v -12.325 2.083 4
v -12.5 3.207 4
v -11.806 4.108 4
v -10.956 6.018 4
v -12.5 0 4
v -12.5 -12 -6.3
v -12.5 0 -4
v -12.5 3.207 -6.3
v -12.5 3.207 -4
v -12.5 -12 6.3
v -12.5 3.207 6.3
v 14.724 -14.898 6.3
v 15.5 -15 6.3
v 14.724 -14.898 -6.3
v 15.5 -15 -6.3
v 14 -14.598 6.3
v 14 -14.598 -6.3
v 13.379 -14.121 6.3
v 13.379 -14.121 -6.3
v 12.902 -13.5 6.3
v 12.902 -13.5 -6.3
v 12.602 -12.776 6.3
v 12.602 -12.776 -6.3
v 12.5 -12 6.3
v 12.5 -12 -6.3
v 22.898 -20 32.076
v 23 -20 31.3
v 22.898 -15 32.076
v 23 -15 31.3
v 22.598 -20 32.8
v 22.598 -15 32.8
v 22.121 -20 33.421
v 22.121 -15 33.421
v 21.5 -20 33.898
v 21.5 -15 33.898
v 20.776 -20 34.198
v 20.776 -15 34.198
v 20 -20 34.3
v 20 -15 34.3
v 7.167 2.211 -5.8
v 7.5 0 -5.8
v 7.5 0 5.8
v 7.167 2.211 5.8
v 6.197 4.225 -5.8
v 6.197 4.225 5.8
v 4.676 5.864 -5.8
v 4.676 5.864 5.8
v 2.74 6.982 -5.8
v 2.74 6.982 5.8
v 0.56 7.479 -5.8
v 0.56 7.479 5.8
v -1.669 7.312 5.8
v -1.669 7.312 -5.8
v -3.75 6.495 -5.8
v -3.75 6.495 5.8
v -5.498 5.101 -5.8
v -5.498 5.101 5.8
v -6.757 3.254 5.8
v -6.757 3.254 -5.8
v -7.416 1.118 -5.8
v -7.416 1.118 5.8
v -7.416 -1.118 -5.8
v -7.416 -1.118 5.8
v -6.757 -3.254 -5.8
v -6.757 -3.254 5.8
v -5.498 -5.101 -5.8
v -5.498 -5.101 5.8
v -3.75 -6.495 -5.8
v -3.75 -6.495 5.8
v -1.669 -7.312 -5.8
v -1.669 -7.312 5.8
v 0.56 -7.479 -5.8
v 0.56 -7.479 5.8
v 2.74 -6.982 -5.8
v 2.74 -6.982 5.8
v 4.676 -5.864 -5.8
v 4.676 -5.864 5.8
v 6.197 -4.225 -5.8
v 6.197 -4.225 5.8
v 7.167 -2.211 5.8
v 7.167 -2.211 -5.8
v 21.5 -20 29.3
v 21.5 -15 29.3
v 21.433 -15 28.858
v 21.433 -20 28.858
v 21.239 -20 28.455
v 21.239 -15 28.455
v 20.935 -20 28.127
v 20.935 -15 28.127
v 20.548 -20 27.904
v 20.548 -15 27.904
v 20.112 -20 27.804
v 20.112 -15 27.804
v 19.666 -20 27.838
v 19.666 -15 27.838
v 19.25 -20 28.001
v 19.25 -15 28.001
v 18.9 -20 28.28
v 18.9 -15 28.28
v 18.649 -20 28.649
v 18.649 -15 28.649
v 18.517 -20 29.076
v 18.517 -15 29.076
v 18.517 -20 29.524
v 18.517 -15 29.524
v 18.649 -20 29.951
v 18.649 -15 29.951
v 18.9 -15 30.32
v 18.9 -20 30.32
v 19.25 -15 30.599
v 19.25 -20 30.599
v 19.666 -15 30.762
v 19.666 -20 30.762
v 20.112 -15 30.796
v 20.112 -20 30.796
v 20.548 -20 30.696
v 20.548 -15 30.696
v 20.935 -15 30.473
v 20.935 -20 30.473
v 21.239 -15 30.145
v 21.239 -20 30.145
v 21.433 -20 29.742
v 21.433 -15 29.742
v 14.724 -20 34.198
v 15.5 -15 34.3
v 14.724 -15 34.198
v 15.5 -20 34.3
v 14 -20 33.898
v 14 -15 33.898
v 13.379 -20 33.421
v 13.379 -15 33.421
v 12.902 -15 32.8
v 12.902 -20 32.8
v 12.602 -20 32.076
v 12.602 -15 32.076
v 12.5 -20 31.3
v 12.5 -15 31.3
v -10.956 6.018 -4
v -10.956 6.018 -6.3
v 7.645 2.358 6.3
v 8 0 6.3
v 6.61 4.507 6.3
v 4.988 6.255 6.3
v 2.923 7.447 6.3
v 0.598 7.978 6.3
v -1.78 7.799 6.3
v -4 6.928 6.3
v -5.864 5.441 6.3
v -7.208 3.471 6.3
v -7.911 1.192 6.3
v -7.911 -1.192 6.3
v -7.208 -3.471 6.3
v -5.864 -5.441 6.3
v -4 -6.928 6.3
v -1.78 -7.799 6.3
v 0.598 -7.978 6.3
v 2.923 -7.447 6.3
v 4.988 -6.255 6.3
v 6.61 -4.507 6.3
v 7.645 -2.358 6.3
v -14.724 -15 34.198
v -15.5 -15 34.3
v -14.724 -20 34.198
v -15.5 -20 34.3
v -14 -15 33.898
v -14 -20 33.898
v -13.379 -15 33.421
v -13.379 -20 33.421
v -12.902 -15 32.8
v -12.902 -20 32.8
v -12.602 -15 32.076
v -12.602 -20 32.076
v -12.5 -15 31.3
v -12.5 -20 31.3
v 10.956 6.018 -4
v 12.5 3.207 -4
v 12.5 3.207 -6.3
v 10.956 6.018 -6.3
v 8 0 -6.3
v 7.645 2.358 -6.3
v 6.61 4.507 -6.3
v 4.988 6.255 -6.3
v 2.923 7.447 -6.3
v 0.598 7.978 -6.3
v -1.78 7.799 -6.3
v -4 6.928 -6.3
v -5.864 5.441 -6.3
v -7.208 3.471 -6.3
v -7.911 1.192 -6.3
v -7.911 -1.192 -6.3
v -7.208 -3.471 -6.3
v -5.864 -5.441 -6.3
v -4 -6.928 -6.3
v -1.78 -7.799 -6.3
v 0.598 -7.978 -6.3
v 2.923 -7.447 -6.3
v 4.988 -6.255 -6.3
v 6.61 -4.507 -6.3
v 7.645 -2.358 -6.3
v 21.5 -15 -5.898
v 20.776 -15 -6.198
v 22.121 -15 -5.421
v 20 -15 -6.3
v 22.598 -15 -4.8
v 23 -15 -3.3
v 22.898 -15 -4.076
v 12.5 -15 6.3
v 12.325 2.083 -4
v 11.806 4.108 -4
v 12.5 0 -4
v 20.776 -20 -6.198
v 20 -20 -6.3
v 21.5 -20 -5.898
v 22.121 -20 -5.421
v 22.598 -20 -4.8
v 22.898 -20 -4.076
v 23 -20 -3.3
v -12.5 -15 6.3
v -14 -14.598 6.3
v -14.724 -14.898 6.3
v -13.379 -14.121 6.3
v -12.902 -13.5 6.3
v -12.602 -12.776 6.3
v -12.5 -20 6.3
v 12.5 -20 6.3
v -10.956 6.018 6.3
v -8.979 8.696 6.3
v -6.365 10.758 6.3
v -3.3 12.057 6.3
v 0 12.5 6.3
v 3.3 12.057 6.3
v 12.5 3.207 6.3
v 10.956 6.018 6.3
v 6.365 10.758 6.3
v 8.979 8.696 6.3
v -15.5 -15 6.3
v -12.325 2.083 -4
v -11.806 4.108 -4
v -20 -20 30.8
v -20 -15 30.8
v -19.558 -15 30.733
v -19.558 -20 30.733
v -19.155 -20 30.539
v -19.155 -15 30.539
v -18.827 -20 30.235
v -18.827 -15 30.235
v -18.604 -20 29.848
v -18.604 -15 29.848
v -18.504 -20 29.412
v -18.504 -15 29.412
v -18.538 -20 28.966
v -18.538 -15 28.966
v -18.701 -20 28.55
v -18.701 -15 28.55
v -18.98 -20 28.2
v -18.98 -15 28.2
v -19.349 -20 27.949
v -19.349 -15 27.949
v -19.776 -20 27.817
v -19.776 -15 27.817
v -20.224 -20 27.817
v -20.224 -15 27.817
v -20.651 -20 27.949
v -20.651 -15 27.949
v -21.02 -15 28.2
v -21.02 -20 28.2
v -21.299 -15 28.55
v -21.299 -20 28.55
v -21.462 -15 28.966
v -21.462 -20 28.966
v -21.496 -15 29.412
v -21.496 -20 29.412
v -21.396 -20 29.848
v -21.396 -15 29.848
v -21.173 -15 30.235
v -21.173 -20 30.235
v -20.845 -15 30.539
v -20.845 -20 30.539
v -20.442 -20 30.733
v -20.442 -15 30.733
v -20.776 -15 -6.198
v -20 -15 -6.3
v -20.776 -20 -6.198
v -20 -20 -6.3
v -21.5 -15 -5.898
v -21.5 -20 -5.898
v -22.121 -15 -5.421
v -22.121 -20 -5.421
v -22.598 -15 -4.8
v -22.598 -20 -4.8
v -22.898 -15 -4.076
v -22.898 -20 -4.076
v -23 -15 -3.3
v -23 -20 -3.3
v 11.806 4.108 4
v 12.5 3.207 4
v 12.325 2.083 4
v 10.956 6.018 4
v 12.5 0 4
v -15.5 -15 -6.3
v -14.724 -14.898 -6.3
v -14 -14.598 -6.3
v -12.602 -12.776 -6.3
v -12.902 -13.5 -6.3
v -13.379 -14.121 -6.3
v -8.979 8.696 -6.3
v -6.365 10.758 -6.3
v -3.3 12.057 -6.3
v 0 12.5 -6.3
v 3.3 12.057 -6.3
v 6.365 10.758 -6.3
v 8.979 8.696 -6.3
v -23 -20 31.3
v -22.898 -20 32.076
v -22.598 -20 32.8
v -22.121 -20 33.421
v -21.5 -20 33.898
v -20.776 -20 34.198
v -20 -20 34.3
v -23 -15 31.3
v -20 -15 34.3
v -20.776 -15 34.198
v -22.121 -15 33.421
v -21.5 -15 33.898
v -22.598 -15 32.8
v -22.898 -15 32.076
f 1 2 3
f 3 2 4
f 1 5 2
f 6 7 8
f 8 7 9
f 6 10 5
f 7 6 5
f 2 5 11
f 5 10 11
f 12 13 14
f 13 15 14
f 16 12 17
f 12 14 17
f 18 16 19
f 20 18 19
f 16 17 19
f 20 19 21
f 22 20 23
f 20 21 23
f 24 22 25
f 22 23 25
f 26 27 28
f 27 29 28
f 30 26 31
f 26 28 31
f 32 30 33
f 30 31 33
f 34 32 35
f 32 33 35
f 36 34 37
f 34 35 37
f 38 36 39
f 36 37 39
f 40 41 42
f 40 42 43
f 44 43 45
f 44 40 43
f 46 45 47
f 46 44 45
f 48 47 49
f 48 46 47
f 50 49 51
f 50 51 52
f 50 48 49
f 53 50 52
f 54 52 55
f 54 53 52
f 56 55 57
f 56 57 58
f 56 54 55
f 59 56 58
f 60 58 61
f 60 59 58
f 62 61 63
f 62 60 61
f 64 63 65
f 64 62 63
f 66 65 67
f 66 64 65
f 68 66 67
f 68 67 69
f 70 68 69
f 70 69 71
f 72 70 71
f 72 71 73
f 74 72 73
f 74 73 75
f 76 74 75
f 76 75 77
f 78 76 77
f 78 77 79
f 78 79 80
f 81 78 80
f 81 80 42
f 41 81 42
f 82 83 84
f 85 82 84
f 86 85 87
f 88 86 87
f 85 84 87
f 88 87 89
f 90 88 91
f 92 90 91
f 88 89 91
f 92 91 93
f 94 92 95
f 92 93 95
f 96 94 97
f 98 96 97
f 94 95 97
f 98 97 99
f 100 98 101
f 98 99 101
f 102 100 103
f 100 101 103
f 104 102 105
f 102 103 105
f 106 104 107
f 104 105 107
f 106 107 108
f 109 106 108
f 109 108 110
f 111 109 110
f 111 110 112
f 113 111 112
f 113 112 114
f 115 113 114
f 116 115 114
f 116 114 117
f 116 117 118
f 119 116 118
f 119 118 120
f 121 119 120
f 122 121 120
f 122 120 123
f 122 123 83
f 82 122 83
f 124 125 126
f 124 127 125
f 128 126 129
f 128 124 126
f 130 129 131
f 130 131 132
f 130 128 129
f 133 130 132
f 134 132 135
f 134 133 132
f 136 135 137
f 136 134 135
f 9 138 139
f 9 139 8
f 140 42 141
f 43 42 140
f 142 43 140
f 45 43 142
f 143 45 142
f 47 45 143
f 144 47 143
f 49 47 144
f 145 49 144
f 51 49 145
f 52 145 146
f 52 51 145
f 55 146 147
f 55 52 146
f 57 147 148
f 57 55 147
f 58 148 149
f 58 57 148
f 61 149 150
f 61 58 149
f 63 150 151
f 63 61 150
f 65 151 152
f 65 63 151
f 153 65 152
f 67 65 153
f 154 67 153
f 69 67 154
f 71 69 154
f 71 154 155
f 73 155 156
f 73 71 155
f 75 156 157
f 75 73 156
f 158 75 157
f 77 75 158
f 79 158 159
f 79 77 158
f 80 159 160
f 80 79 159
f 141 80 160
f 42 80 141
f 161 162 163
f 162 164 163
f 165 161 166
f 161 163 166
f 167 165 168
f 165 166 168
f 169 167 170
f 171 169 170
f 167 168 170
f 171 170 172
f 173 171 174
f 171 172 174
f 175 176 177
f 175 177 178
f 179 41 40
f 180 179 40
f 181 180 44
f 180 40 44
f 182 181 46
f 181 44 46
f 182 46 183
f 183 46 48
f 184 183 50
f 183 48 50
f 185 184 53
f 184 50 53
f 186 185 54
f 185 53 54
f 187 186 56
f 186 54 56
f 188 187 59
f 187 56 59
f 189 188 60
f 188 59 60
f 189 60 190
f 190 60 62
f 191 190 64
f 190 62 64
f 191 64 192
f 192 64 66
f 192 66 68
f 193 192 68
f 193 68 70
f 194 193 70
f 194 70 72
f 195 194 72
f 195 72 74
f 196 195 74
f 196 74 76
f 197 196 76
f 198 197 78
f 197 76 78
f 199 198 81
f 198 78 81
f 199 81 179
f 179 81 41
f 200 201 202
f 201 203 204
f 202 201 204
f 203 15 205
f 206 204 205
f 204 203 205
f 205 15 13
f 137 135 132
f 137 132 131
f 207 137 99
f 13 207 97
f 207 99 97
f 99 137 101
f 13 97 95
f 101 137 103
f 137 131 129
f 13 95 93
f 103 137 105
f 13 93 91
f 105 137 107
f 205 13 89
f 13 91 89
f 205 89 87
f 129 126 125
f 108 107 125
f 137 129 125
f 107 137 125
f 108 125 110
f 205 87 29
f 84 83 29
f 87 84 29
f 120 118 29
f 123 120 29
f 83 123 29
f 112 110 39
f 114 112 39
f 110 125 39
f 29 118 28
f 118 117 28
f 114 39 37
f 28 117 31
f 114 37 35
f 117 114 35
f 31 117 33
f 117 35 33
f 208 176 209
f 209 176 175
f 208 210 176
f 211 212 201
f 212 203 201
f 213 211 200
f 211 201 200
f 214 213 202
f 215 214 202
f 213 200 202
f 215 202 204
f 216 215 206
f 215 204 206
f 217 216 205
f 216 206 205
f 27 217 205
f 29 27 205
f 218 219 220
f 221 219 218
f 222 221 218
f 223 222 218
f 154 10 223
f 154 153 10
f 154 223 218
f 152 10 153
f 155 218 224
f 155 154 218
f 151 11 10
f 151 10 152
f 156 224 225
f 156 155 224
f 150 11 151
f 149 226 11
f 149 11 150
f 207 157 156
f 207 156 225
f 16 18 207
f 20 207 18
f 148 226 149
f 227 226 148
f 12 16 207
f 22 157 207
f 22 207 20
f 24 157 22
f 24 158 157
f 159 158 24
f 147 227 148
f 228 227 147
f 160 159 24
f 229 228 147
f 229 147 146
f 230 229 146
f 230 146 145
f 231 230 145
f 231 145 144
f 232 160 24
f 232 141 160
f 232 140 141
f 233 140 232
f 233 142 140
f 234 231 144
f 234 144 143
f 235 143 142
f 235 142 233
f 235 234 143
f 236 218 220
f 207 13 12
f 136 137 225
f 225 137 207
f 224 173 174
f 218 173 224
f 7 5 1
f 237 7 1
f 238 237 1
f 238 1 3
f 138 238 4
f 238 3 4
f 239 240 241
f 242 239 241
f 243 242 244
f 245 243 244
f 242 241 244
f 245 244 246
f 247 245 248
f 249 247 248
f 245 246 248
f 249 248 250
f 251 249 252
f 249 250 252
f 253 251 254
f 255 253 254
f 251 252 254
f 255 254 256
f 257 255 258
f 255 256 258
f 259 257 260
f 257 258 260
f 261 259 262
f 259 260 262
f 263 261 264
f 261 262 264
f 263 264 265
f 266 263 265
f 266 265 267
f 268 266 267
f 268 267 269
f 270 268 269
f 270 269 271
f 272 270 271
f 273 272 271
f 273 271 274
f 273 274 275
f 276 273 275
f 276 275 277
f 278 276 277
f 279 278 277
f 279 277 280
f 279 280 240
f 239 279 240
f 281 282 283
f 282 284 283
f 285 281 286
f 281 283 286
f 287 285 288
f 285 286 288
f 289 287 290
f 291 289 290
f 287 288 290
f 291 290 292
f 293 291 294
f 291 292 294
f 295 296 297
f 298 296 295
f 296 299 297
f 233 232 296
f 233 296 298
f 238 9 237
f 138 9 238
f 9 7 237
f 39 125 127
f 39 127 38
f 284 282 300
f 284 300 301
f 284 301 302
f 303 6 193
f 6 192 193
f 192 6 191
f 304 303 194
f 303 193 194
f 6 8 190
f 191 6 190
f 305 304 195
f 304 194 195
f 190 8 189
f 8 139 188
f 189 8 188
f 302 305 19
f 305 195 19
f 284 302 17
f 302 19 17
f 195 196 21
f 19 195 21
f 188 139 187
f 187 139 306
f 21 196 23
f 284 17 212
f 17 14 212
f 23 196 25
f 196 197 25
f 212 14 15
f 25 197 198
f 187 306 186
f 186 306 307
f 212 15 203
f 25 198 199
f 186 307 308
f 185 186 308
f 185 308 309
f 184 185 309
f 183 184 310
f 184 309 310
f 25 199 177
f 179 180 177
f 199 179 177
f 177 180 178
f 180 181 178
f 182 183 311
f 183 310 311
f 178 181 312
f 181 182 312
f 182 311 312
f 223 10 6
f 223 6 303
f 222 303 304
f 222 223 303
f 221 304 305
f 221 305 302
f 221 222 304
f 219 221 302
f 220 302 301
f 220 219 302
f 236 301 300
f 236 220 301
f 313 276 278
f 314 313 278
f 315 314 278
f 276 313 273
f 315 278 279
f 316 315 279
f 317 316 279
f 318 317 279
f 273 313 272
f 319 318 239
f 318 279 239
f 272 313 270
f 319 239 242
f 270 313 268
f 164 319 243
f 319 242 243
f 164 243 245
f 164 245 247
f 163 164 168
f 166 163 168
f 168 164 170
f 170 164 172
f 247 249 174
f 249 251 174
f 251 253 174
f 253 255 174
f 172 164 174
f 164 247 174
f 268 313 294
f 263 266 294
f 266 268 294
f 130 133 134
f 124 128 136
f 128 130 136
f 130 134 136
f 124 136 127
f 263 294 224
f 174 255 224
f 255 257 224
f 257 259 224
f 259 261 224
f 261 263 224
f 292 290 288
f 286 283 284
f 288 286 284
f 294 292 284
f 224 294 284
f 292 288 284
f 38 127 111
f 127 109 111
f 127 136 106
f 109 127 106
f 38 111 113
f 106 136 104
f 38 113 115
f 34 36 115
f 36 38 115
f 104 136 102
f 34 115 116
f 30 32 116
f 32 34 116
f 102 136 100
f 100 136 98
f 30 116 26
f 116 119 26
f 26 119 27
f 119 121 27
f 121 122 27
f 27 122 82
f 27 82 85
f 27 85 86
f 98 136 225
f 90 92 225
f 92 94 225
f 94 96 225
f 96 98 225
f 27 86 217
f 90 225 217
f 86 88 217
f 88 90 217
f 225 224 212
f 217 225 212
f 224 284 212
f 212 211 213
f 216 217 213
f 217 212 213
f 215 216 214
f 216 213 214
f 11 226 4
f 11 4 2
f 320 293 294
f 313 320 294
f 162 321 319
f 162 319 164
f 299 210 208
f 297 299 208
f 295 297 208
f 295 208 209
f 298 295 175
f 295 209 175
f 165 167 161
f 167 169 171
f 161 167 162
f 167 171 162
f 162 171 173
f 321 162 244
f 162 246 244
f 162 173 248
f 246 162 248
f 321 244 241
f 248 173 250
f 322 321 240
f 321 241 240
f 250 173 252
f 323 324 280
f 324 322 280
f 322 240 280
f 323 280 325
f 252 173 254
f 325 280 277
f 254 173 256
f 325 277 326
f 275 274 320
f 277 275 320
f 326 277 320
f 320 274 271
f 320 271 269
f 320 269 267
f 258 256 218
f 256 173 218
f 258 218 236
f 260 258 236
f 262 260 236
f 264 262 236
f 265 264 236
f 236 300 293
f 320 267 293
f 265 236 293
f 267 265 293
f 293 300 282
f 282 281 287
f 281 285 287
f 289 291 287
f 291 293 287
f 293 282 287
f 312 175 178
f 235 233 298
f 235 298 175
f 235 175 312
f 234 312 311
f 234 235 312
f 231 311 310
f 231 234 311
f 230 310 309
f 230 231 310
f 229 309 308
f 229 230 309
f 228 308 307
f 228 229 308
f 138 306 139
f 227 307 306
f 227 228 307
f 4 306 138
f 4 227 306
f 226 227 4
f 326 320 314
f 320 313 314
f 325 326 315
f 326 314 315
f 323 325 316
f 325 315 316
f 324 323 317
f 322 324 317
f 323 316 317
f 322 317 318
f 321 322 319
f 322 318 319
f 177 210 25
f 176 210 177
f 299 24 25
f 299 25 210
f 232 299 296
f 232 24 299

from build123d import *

# Parameters (mm, degrees)
SKETCH_1_R           = 7.5
EXTRUDE_1_DEPTH      = 6.3
CUT_EXTRUDE_1_DEPTH  = 4
SKETCH_3_R           = 2
CUT_EXTRUDE_2_DEPTH  = 41.027365639
CHAMFER_1_SIZE       = 0.5
EXTRUDE_2_DEPTH      = 28
EXTRUDE_2_DEPTH_BACK = 12.6
SKETCH_5_R           = 1.5
CUT_EXTRUDE_3_DEPTH  = 46.885618662
SKETCH_6_W           = 25
SKETCH_6_H           = 28
CUT_EXTRUDE_4_DEPTH  = 46.885618662
SKETCH_7_W           = 10
SKETCH_7_H           = 22.359066313
SKETCH_7_W_2         = 10.5
SKETCH_7_H_2         = 23.032343059
CUT_EXTRUDE_5_DEPTH  = 42.388404173
FILLET_1_R           = 3


with BuildPart() as part:
    # 草图1 → 凸台-拉伸1 (new, symmetric)
    with BuildSketch(Plane.XY):
        with BuildLine():
            Line((-22.5, -20), (22.5, -20))
            Line((22.5, -20), (22.5, -15))
            Line((22.5, -15), (10.956194261, 6.017624724))
            ThreePointArc((10.956194261, 6.017624724), (0, 12.5), (-10.956194261, 6.017624724))
            Line((-10.956194261, 6.017624724), (-22.5, -15))
            Line((-22.5, -15), (-22.5, -20))
        make_face()
        Circle(SKETCH_1_R, mode=Mode.SUBTRACT)
    extrude(amount=EXTRUDE_1_DEPTH, both=True)

    # 草图2 → 切除-拉伸1 (cut, symmetric)
    with BuildSketch(Plane.XY):
        with BuildLine():
            Line((22.5, -15), (12.5, -15))
            Line((12.5, -15), (12.5, 0))
            ThreePointArc((12.5, 0), (12.107898832, 3.106249486), (10.956194261, 6.017624724))
            Line((10.956194261, 6.017624724), (22.5, -15))
        make_face()
        with BuildLine():
            Line((-22.5, -15), (-12.5, -15))
            Line((-12.5, -15), (-12.5, 0))
            ThreePointArc((-12.5, 0), (-12.107898832, 3.106249486), (-10.956194261, 6.017624724))
            Line((-10.956194261, 6.017624724), (-22.5, -15))
        make_face()
    extrude(amount=CUT_EXTRUDE_1_DEPTH, both=True, mode=Mode.SUBTRACT)

    # 草图3 → 切除-拉伸2 (cut, through all)
    with BuildSketch(Plane.XZ.offset(20)):
        with Locations((17.5, 0)):
            Circle(SKETCH_3_R)
        with Locations((-17.5, 0)):
            Circle(SKETCH_3_R)
    extrude(amount=-CUT_EXTRUDE_2_DEPTH, mode=Mode.SUBTRACT)

    # 倒角1
    chamfer_1_edges = [part.edges().sort_by_distance(p)[0] for p in [
        (-7.5, 0, -6.3),
        (-7.5, 0, 6.3),
    ]]
    chamfer(chamfer_1_edges, length=CHAMFER_1_SIZE)

    # 草图4 → 凸台-拉伸2 (add, two sides: drawn at the far end of the back side and taken through both)
    with BuildSketch(Plane.XY.offset(6.3).offset(-EXTRUDE_2_DEPTH_BACK)):
        Polygon((-22.5, -15), (-23, -15), (-23, -20), (-22.5, -20), (23, -20), (23, -15), align=None)
    extrude(amount=EXTRUDE_2_DEPTH + EXTRUDE_2_DEPTH_BACK)

    # 草图5 → 切除-拉伸3 (cut, through all)
    with BuildSketch(Plane(origin=(0, 0, 0), x_dir=(1, 0, 0), z_dir=(0, 1, 0))):
        with Locations((-20, -29.3)):
            Circle(SKETCH_5_R)
        with Locations((20, -29.3)):
            Circle(SKETCH_5_R)
    extrude(amount=-CUT_EXTRUDE_3_DEPTH, mode=Mode.SUBTRACT)

    # 草图6 → 切除-拉伸4 (cut, through all)
    with BuildSketch(Plane(origin=(0, 0, 0), x_dir=(1, 0, 0), z_dir=(0, 1, 0))):
        with Locations((0, -20.3)):
            Rectangle(SKETCH_6_W, SKETCH_6_H)
    extrude(amount=-CUT_EXTRUDE_4_DEPTH, mode=Mode.SUBTRACT)

    # 草图7 → 切除-拉伸5 (cut, through all)
    with BuildSketch(Plane.XY.offset(6.3)):
        with Locations((-17.5, -3.820466844)):
            Rectangle(SKETCH_7_W, SKETCH_7_H)
        with Locations((17.75, -3.483828471)):
            Rectangle(SKETCH_7_W_2, SKETCH_7_H_2)
    extrude(amount=-CUT_EXTRUDE_5_DEPTH, mode=Mode.SUBTRACT)

    # 圆角1
    fillet_1_edges = [part.edges().sort_by_distance(p)[0] for p in [
        (-12.5, -15, 0),
        (12.5, -15, 0),
    ]]
    fillet(fillet_1_edges, radius=FILLET_1_R)
    fillet_1_2_edges = [part.edges().sort_by_distance(p)[0] for p in [
        (23, -17.5, -6.3),
        (-23, -17.5, -6.3),
        (-23, -17.5, 34.3),
        (-12.5, -17.5, 34.3),
        (12.5, -17.5, 34.3),
        (23, -17.5, 34.3),
    ]]
    fillet(fillet_1_2_edges, radius=FILLET_1_R)


solid = part.part
